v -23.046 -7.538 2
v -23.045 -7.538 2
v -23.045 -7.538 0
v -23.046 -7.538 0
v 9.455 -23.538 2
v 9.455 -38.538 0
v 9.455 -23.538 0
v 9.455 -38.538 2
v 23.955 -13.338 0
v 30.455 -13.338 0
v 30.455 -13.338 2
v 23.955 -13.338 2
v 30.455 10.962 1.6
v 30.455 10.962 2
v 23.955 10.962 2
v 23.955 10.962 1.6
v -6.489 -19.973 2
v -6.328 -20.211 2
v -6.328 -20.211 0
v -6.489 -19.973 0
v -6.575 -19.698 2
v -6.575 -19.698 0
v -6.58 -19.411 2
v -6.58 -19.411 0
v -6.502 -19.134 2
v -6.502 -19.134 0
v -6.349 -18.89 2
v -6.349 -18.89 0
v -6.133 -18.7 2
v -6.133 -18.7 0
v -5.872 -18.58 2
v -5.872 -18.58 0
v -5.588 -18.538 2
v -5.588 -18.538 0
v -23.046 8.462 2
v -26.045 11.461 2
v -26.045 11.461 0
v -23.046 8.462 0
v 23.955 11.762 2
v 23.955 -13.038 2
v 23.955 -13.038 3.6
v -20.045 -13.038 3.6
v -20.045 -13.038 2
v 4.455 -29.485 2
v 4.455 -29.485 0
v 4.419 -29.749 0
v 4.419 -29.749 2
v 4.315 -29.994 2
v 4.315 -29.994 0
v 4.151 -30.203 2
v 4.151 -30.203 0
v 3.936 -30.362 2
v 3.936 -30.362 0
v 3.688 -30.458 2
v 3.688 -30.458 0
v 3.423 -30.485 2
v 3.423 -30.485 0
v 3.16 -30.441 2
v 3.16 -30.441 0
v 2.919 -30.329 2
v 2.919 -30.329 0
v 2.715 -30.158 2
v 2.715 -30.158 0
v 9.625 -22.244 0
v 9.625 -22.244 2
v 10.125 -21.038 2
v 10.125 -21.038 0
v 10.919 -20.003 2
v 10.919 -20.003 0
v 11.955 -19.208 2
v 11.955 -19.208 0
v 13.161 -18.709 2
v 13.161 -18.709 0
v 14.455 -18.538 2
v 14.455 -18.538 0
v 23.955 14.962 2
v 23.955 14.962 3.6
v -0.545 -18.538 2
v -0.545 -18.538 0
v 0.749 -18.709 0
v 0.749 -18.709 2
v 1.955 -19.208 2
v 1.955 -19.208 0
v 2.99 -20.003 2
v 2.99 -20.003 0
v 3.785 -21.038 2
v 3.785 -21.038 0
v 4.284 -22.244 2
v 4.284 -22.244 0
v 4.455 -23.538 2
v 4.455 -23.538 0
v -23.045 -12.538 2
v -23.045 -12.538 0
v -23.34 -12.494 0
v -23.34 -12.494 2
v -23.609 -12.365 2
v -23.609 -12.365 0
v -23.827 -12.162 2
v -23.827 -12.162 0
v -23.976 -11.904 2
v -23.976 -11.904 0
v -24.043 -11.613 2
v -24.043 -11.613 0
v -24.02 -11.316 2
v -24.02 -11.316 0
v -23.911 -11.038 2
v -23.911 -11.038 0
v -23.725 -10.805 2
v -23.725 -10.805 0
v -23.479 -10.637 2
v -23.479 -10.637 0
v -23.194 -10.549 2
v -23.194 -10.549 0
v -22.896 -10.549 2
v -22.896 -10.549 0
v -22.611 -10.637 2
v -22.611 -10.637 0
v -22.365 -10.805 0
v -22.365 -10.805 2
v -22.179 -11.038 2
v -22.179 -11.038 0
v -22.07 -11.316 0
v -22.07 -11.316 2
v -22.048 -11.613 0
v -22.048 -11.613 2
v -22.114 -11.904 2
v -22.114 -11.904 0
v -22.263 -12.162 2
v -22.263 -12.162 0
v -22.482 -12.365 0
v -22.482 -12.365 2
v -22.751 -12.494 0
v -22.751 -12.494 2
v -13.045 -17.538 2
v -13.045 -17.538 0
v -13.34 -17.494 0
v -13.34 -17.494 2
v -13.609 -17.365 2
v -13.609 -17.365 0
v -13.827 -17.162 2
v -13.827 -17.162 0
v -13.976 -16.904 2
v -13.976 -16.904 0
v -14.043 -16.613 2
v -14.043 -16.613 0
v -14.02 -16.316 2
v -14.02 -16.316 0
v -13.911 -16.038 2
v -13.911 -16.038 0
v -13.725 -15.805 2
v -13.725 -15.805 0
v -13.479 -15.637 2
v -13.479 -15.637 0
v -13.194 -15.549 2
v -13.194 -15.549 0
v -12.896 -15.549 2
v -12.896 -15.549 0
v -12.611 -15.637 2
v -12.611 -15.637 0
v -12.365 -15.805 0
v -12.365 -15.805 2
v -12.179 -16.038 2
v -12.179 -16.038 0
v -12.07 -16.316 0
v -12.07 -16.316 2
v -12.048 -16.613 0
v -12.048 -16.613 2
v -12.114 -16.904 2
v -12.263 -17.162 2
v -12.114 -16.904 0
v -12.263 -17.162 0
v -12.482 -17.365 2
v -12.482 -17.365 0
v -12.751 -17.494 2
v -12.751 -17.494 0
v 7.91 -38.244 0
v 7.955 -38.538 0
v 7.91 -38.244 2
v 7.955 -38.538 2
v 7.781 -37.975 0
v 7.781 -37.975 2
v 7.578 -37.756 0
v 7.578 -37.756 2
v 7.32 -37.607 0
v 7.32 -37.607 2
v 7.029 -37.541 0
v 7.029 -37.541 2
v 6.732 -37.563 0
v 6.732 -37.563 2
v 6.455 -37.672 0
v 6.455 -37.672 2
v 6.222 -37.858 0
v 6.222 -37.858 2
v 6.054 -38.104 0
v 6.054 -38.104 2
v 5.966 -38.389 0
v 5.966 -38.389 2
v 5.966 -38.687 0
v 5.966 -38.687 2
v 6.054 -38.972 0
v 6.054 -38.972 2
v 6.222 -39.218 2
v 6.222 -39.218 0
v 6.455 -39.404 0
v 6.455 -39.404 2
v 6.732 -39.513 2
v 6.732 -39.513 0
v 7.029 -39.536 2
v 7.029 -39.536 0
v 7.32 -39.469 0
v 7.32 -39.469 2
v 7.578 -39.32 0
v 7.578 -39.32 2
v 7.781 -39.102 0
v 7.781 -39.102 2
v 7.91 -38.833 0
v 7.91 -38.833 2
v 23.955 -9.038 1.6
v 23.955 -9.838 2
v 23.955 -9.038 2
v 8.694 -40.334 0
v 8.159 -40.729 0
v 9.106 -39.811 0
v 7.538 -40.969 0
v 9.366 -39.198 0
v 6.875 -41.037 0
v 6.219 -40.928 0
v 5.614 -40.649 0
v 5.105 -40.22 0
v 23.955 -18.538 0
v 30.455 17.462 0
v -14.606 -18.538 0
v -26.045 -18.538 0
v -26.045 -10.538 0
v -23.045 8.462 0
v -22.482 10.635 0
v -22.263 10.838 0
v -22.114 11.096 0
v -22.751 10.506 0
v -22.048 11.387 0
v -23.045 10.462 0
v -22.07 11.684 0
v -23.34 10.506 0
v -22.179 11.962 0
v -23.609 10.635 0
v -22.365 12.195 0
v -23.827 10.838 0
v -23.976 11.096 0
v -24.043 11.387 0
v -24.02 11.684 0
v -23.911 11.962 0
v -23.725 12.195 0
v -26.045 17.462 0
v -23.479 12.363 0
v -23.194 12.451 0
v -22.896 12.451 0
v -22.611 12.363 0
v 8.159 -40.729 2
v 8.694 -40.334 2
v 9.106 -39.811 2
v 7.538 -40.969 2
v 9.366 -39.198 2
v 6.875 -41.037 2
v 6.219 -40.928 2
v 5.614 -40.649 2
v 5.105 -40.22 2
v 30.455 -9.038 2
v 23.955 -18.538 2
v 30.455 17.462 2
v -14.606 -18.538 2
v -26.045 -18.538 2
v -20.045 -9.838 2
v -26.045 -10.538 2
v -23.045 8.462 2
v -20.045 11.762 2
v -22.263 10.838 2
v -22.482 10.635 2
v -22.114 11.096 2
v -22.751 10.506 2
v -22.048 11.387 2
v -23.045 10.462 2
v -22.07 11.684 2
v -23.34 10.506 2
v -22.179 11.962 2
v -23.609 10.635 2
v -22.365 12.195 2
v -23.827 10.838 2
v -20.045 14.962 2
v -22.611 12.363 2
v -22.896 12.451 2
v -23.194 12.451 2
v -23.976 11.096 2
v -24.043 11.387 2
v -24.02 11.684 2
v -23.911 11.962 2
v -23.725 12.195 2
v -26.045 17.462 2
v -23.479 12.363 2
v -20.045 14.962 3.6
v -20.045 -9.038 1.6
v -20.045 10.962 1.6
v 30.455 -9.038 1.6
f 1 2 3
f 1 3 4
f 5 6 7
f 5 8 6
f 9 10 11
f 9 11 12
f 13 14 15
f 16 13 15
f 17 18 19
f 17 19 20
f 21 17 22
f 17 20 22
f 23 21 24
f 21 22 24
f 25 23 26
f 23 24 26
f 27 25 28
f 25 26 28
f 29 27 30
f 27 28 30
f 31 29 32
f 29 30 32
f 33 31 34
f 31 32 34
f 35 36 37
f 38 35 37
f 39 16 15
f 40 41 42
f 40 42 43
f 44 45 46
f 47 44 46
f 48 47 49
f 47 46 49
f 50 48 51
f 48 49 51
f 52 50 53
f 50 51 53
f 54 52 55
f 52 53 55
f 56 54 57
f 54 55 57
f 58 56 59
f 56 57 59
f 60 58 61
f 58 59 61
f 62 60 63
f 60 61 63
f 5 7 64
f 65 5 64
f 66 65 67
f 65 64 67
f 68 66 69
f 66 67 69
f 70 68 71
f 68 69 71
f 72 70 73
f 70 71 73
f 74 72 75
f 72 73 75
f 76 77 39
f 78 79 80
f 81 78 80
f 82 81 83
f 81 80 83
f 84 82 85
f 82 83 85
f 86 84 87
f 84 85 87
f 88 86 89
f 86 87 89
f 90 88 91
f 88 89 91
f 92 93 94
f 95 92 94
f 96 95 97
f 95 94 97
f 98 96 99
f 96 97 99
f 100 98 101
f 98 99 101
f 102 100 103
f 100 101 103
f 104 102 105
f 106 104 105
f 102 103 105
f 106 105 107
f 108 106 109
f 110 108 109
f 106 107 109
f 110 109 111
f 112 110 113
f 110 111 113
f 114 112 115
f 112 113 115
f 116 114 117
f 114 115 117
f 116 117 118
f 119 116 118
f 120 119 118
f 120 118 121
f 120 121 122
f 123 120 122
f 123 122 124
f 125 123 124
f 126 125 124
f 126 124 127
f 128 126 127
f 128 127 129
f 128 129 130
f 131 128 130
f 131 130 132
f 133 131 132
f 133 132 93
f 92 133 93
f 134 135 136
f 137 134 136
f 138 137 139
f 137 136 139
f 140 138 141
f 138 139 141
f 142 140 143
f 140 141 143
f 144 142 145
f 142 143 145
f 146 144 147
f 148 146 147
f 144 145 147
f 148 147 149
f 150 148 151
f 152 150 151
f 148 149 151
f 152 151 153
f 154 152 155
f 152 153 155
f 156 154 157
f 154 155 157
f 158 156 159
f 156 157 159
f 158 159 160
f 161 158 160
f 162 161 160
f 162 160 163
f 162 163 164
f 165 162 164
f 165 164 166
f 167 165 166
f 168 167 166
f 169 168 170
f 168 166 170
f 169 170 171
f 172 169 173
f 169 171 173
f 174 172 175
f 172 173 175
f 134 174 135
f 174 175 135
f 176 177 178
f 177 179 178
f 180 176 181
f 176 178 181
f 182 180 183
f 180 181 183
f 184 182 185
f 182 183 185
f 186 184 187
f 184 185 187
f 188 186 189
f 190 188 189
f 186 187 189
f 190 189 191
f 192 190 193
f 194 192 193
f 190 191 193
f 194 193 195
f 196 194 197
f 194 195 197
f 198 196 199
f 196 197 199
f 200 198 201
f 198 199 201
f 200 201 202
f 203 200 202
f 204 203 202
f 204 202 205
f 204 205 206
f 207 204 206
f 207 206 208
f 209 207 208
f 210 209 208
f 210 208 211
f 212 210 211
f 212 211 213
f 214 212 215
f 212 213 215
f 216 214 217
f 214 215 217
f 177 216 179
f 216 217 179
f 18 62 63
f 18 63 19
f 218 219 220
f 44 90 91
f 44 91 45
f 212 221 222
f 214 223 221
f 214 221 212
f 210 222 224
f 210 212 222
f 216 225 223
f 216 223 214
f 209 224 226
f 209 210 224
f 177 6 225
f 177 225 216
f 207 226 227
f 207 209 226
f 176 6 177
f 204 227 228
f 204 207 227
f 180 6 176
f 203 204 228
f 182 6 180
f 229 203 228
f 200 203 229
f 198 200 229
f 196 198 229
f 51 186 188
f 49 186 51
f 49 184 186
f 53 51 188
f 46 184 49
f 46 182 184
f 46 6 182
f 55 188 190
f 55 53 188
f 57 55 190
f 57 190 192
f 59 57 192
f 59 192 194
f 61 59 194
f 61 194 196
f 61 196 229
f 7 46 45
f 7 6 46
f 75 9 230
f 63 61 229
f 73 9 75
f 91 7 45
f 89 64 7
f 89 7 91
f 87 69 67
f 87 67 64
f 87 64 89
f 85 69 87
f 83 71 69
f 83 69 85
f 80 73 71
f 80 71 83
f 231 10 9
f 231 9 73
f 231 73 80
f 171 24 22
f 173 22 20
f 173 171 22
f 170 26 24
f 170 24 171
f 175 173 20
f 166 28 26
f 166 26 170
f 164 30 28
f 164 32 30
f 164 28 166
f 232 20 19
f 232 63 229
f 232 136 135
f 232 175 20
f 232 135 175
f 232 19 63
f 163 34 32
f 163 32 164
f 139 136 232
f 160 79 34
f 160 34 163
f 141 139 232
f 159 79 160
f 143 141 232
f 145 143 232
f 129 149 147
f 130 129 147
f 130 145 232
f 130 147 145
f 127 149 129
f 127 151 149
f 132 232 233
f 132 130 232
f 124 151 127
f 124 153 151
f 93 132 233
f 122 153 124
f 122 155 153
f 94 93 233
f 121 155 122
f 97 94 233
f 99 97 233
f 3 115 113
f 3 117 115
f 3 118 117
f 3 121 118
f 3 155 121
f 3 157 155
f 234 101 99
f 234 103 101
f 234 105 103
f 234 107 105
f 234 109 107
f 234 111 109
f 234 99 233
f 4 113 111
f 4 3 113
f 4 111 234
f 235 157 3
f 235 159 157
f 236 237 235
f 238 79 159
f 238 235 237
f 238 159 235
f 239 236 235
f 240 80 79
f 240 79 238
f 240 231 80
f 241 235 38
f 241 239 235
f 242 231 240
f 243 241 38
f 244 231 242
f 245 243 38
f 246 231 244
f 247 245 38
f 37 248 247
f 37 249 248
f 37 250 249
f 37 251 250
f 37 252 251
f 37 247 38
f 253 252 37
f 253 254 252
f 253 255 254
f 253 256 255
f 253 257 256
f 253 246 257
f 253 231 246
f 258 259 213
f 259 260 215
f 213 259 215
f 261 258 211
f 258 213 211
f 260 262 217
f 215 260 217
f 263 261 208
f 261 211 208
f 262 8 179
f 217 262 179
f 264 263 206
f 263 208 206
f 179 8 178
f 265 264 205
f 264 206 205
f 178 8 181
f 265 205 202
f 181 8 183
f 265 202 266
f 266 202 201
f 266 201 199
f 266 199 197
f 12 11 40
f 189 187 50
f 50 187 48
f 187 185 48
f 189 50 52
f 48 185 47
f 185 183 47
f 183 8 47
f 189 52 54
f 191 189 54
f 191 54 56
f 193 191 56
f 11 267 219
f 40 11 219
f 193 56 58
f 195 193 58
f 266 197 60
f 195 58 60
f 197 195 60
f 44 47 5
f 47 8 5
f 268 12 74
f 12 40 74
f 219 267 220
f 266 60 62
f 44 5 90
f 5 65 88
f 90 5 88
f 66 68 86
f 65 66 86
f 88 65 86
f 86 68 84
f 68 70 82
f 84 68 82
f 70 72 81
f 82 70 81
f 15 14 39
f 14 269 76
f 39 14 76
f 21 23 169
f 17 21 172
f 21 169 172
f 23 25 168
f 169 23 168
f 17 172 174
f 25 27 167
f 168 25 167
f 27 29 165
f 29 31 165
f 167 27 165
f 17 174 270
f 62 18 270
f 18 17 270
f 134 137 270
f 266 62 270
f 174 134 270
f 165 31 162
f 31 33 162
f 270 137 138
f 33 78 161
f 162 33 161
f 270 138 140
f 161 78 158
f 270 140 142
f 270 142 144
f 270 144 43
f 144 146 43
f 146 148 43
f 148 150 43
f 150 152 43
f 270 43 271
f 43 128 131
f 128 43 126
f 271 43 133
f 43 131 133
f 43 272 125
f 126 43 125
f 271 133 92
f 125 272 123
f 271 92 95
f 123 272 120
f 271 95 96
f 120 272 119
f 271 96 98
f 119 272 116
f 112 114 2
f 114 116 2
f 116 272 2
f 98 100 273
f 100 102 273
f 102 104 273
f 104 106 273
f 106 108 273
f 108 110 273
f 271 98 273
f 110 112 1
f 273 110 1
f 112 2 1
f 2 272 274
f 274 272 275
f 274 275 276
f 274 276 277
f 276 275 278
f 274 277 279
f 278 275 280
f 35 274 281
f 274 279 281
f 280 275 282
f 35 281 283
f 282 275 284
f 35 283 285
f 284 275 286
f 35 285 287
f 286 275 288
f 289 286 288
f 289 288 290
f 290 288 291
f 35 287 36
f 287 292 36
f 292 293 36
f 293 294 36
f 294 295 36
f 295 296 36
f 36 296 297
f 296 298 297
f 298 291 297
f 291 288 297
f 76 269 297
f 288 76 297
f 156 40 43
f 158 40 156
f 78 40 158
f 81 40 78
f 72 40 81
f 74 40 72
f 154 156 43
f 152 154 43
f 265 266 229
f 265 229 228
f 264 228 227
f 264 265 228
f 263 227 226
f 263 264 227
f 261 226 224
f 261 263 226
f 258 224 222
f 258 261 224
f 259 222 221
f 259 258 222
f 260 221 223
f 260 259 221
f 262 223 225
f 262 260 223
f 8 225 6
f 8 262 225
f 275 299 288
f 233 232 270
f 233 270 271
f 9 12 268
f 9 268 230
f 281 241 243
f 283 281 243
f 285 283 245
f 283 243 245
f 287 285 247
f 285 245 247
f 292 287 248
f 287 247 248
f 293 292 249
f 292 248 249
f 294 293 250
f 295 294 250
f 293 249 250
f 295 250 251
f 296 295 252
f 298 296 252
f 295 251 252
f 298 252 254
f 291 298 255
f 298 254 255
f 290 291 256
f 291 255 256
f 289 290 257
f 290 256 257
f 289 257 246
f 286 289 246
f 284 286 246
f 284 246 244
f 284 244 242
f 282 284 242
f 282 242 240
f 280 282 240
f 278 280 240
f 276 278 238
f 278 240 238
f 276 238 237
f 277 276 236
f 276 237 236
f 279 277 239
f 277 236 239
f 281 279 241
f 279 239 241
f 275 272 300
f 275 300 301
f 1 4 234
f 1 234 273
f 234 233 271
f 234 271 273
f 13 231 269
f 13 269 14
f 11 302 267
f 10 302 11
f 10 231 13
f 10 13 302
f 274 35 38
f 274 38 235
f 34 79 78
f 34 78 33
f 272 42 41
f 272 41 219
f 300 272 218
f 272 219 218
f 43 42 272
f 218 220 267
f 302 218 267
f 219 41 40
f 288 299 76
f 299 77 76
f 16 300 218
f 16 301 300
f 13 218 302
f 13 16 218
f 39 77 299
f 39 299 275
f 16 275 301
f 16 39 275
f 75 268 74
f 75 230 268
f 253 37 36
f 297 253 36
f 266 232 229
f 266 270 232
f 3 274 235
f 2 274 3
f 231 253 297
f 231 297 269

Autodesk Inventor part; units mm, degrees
ref_plane "YZ Plane" through (0, 0, 0) normal (1, 0, 0) x (0, 1, 0)
ref_plane "XZ Plane" through (0, 0, 0) normal (0, 1, 0) x (-1, 0, 0)
ref_plane "XY Plane" through (0, 0, 0) normal (0, 0, 1) x (1, 0, 0)
sketch "Sketch1" plane through (0, 0, 0) normal (0, 0, 1) x (1, 0, 0)
  line L0 (-26.0453, 15.4617) -> (23.9547, 15.4617)
  line L1 (23.9547, 15.4617) -> (23.9547, -18.5383)
  line L2 (23.9547, -18.5383) -> (-26.0453, -18.5383)
  line L3 (-26.0453, -18.5383) -> (-26.0453, 15.4617)
  point P0 (0, 0)
  dimension "d0" = 50
  dimension "d1" = 34
extrude "Extrusion1" add sketch "Sketch1" along normal blind 2
sketch "Sketch2" plane through (0, 0, 2) normal (0, 0, 1) x (1, 0, 0)
  line L0 (-26.0453, 15.4617) -> (-26.0453, -18.5383) projected
  line L1 (23.9547, 15.4617) -> (-26.0453, 15.4617) projected
  point P0 (0, 0)
  point P1 (-23.0453, 11.4617)
  point P2 (-23.0453, -11.5383)
  point P3 (-13.0453, -16.5383)
  dimension "d4" = 23
  dimension "d5" = 3
  dimension "d6" = 3
  dimension "d7" = 4
  dimension "d8" = 5
  dimension "d9" = 10
hole "Hole1" at (-23.0453, 11.4617, 2) at (-23.0453, -11.5383, 2) at (-13.0453, -16.5383, 2) direction (0, 0, -1) diameter 2 depth 6.5 tip angle 118
sketch "Sketch3" plane through (0, 0, 2) normal (0, 0, 1) x (1, 0, 0)
  line L0 (-26.0453, 15.4617) -> (-26.0453, -18.5383) projected
  line L1 (-26.0453, 8.4617) -> (-23.0453, 8.4617)
  line L2 (-23.0453, 8.4617) -> (-23.0453, -7.5383)
  line L3 (-23.0453, -7.5383) -> (-26.0453, -7.5383)
  line L4 (-26.0453, -7.5383) -> (-26.0453, 8.4617)
  line L5 (23.9547, 15.4617) -> (-26.0453, 15.4617) projected
  circle A0 centre (-23.0453, -11.5383) radius 1 projected
  point P0 (0, 0)
  dimension "d17" = 7
  dimension "d18" = 4
  dimension "d19" = 3
extrude "Extrusion2" cut sketch "Sketch3" against normal blind 2 contours L1 L2 L3 L0
chamfer "Chamfer1" distance 3 angle 45 2 edges at (-26.0453, 8.4617, 1) (-26.0453, -7.5383, 1)
sketch "Sketch5" plane through (0, 0, 2) normal (0, 0, 1) x (1, 0, 0)
  line L0 (-20.0453, 14.9617) -> (23.9547, 14.9617)
  line L1 (23.9547, 14.9617) -> (23.9547, -13.0383)
  line L2 (23.9547, -13.0383) -> (-20.0453, -13.0383)
  line L3 (-20.0453, -13.0383) -> (-20.0453, 14.9617)
  line L4 (23.9547, 15.4617) -> (-26.0453, 15.4617) projected
  line L5 (-26.0453, -18.5383) -> (23.9547, -18.5383) projected
  line L6 (-23.0453, 8.4617) -> (-23.0453, -7.5383) projected
  line L7 (23.9547, -18.5383) -> (23.9547, 15.4617) projected
  circle A0 centre (-13.0453, -16.5383) radius 1 projected
  point P0 (0, 0)
  dimension "d27" = 3
  dimension "d28" = 0
  dimension "d29" = 50
  dimension "d30" = 3.5
  dimension "d31" = 31.5
  dimension "d32" = 0.5
extrude "Extrusion3" cut sketch "Sketch5" against normal blind 0.4 contours L0 L1 L2 L3
sketch "Sketch8" plane through (0, 0, 2) normal (0, 0, 1) x (1, 0, 0)
  line L0 (-26.0453, -18.5383) -> (23.9547, -18.5383) projected
  line L1 (11.9547, -18.5383) -> (-1.0453, -18.5383)
  line L2 (-1.0453, -18.5383) -> (-1.0453, -44.5383)
  line L3 (-1.0453, -44.5383) -> (11.9547, -44.5383)
  line L4 (11.9547, -44.5383) -> (11.9547, -18.5383)
  line L5 (23.9547, -18.5383) -> (23.9547, 15.4617) projected
  circle A0 centre (-13.0453, -16.5383) radius 1 projected
  line L6 (6.9547, -38.5383) -> (6.9547, -18.5383) construction
  line L7 (9.4547, -38.5383) -> (9.4547, -18.5383)
  line L8 (4.4547, -18.5383) -> (4.4547, -38.5383)
  arc A1 (4.4547, -38.5383) -> (9.4547, -38.5383) centre (6.9547, -38.5383) ccw
  arc A2 (9.4547, -18.5383) -> (4.4547, -18.5383) centre (6.9547, -18.5383) ccw
  circle A3 centre (6.9547, -38.5383) radius 1
  point P0 (0, 0)
  point P1 (23.9547, -13.0383)
  point P2 (6.9547, -28.5383)
  dimension "d48" = 12
  dimension "d49" = 25
  dimension "d50" = 20
  dimension "d51" = 22
  dimension "d52" = 6
  dimension "d53" = 5
  dimension "d54" = 2
extrude "Extrusion6" add sketch "Sketch8" against normal blind 2 contours L0 L7 A1 L8
fillet "Fillet1" radius 5 2 edges at (4.4547, -18.5383, 1) (9.4547, -18.5383, 1)
sketch "Sketch9" plane through (0, 0, 2) normal (0, 0, 1) x (1, 0, 0)
  circle A0 centre (-13.0453, -16.5383) radius 1 projected
  circle A1 centre (6.9547, -38.5383) radius 1 projected
  line L0 (-13.0453, -16.5383) -> (6.9547, -38.5383) construction
  line L1 (-14.8951, -18.22) -> (5.1049, -40.22)
  line L2 (8.8046, -36.8566) -> (-11.1954, -14.8566)
  arc A2 (-11.1954, -14.8566) -> (-14.8951, -18.22) centre (-13.0453, -16.5383) ccw
  arc A3 (5.1049, -40.22) -> (8.8046, -36.8566) centre (6.9547, -38.5383) ccw
  line L3 (-26.0453, -18.5383) -> (-0.5453, -18.5383) projected
  line L4 (-14.6058, -18.5383) -> (-7.8485, -18.5383)
  line L5 (4.4547, -23.5383) -> (4.4547, -38.5383) projected
  line L6 (4.4547, -32.0718) -> (4.4547, -38.5383)
  line L7 (4.4547, -38.5383) -> (6.7171, -41.027)
  arc A4 (4.4547, -38.5383) -> (9.4547, -38.5383) centre (6.9547, -38.5383) ccw projected
  point P0 (0, 0)
  point P1 (-3.0453, -27.5383)
extrude "Extrusion7" add sketch "Sketch9" against normal blind 2 contours L3 L2 L5 A4 L1
fillet "Fillet2" radius 1 2 edges at (-7.8485, -18.5383, 1) (4.4547, -32.0718, 1)
sketch "Sketch10" plane through (-26.0453, 15.4617, 0) normal (0, 1, 0) x (1, 0, 0)
  line L0 (50, 0) -> (50, -2) projected
  line L1 (0, 0) -> (0, -2) projected
  line L2 (50, -2) -> (0, -2)
  line L3 (0, -2) -> (0, 0)
  line L4 (0, 0) -> (50, 0)
  line L5 (50, 0) -> (50, -2)
  point P0 (26.0453, 0)
extrude "Extrusion8" add sketch "Sketch10" along normal blind 2
sketch "Sketch13" plane through (23.9547, -18.5383, 2) normal (1, 0, 0) x (0, 0, -1)
  line L0 (0, 0) -> (0, 5.5) projected
  line L1 (0.4, 5.5) -> (0.4, 33.5) projected
  line L2 (0.4, 5.5) -> (0, 5.5) projected
  line L3 (-1.6, 5.5) -> (0.4, 9.5)
  line L4 (0, 5.5) -> (0.4, 5.5) projected
  line L5 (-1.6, 5.5) -> (0.4, 5.5)
  line L6 (0.4, 5.5) -> (0.4, 9.5)
  point P0 (2, 18.5383)
  point P1 (0.4, 30.4)
  dimension "d70" = 1.6
  dimension "d71" = 4
extrude "Extrusion11" add sketch "Sketch13" against normal blind 44
sketch "Sketch14" plane through (23.9547, -18.5383, 2) normal (1, 0, 0) x (0, 0, -1)
  line L0 (0, 33.5) -> (0, 36) projected
  line L1 (0.4, 33.5) -> (0.4, 9.5) projected
  line L2 (0, 33.5) -> (0.4, 33.5) projected
  line L3 (-1.6, 33.5) -> (0.4, 29.5)
  line L4 (-1.6, 33.5) -> (0.4, 33.5)
  line L5 (0.4, 29.5) -> (0.4, 33.5)
  point P0 (2, 18.5383)
  dimension "d74" = 1.6
  dimension "d75" = 4
extrude "Extrusion12" add sketch "Sketch14" against normal blind 44
sketch "Sketch15" plane through (0, 0, 0) normal (0, 0, -1) x (-1, 0, 0)
  line L0 (-23.9547, -18.5383) -> (-23.9547, 17.4617) projected
  line L1 (-23.9547, 17.4617) -> (-30.4547, 17.4617)
  line L2 (-30.4547, 17.4617) -> (-30.4547, -13.3383)
  line L3 (-30.4547, -13.3383) -> (-23.9547, -13.3383)
  line L4 (-23.9547, -13.3383) -> (-23.9547, 17.4617)
  line L5 (-14.4547, -18.5383) -> (-23.9547, -18.5383) projected
  point P0 (0, 0)
  dimension "d78" = 5.2
  dimension "d79" = 6.5
extrude "Extrusion13" add sketch "Sketch15" against normal blind 2
sketch "Sketch16" plane through (0, 0, 2) normal (0, 0, 1) x (1, 0, 0)
  line L0 (30.4547, -13.3383) -> (30.4547, 17.4617) projected
  line L1 (-20.0453, -9.0383) -> (23.9547, -9.0383) projected
  line L2 (30.4547, 10.9617) -> (-20.0453, 10.9617)
  line L3 (-20.0453, 10.9617) -> (-20.0453, -9.0383)
  line L4 (-20.0453, -9.0383) -> (30.4547, -9.0383)
  line L5 (30.4547, -9.0383) -> (30.4547, 10.9617)
  line L6 (23.9547, 10.9617) -> (-20.0453, 10.9617) projected
  point P0 (0, 0)
  point P1 (30.4547, -9.0383)
extrude "Extrusion14" cut sketch "Sketch16" against normal blind 0.4
